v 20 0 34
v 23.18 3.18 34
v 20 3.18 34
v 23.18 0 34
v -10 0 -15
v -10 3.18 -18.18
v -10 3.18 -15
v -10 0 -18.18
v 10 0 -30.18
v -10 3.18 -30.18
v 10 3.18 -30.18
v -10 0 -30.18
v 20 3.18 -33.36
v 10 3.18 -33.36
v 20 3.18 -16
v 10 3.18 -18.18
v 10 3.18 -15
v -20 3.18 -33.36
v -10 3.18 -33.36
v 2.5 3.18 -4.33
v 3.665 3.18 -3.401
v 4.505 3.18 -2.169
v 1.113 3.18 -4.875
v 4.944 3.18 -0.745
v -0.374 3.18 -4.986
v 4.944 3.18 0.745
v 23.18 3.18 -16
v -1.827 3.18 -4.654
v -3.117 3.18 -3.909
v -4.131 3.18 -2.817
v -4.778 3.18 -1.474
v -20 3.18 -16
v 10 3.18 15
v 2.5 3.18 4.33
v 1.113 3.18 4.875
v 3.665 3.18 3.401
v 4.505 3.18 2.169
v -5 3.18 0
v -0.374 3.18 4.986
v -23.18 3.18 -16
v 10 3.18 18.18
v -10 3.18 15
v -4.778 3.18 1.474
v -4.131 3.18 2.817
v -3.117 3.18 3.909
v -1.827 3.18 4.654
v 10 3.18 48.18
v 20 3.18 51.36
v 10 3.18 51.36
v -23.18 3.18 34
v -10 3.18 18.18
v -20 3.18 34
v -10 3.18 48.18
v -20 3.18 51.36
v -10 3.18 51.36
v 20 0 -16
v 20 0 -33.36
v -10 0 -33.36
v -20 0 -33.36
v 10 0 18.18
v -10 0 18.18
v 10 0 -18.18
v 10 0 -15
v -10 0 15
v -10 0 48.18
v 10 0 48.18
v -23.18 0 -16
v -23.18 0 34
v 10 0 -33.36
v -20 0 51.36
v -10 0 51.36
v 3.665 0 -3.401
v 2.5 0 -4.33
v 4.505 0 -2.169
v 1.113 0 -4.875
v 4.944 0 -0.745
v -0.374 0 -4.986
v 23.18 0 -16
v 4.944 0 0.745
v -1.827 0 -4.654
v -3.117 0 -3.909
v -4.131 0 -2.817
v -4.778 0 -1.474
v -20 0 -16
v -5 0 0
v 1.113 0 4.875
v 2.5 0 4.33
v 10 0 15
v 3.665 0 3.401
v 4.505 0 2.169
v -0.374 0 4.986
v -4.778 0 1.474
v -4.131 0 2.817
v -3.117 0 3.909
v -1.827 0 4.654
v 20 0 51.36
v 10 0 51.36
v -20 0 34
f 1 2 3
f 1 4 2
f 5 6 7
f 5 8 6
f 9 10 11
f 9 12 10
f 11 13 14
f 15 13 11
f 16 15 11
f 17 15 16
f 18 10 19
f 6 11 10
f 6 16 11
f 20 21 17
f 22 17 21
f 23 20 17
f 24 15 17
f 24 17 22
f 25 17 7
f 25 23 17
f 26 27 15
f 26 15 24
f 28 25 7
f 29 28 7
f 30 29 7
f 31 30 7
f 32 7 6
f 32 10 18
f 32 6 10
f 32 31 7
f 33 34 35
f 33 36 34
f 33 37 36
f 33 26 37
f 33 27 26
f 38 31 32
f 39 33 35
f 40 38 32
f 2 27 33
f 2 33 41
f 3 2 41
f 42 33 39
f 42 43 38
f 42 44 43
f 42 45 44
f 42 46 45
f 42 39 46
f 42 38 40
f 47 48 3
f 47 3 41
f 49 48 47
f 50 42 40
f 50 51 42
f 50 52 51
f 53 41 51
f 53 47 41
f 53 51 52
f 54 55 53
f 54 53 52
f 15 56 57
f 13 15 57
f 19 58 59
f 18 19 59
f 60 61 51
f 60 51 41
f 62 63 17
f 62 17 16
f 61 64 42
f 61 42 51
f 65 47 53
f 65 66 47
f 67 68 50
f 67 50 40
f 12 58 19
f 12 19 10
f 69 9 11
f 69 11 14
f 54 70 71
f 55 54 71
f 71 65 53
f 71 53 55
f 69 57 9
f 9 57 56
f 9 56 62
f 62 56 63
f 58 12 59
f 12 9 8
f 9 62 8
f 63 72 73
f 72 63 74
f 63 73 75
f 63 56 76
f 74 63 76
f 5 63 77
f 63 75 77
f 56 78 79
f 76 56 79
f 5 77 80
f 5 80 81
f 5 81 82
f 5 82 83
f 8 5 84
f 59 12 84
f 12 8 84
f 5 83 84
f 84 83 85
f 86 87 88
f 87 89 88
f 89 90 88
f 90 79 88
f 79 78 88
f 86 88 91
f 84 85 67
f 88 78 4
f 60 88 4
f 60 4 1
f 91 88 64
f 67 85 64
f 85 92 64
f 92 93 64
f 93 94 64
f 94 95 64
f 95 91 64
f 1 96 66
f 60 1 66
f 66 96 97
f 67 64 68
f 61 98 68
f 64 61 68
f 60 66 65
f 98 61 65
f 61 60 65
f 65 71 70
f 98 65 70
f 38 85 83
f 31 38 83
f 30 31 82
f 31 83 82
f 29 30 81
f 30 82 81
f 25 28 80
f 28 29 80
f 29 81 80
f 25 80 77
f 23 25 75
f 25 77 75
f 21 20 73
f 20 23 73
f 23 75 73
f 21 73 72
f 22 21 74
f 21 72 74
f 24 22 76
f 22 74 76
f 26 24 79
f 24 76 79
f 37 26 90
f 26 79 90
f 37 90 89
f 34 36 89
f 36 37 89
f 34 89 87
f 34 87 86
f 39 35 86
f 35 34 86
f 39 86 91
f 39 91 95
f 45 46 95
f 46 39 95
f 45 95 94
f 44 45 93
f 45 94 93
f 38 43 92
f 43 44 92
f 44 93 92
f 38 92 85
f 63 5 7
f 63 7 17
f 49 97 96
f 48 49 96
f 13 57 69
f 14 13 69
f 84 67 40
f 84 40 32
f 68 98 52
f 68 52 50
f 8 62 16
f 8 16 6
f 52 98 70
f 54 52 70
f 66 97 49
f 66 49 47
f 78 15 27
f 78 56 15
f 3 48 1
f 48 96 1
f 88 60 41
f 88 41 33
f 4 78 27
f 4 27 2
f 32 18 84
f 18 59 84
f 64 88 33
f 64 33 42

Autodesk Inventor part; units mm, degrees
ref_plane "YZ Plane" through (0, 0, 0) normal (1, 0, 0) x (0, 1, 0)
ref_plane "XZ Plane" through (0, 0, 0) normal (0, 1, 0) x (-1, 0, 0)
ref_plane "XY Plane" through (0, 0, 0) normal (0, 0, 1) x (1, 0, 0)
sketch "Boceto1" plane through (0, 0, 0) normal (0, 1, 0) x (-1, 0, 0)
  circle A0 centre (0, 0) radius 5
  line L0 (20, 51.36) -> (-20, 51.36)
  line L1 (-20, 51.36) -> (-20, -33.36)
  line L2 (-20, -33.36) -> (20, -33.36)
  line L3 (20, -33.36) -> (20, 51.36)
  line L4 (10, -15) -> (-10, -15)
  line L5 (-10, -15) -> (-10, -18.18)
  line L6 (-10, -18.18) -> (10, -18.18)
  line L7 (10, -18.18) -> (10, -15)
  line L8 (10, -15) -> (-10, -18.18) construction
  line L9 (-10, -15) -> (10, -18.18) construction
  line L10 (10, -30.18) -> (-10, -30.18)
  line L11 (-10, -30.18) -> (-10, -33.36)
  line L12 (-10, -33.36) -> (10, -33.36)
  line L13 (10, -33.36) -> (10, -30.18)
  line L14 (10, -30.18) -> (-10, -33.36) construction
  line L15 (-10, -30.18) -> (10, -33.36) construction
  line L16 (10, 18.18) -> (-10, 18.18)
  line L17 (-10, 18.18) -> (-10, 15)
  line L18 (-10, 15) -> (10, 15)
  line L19 (10, 15) -> (10, 18.18)
  line L20 (10, 18.18) -> (-10, 15) construction
  line L21 (-10, 18.18) -> (10, 15) construction
  line L22 (10, 51.36) -> (-10, 51.36)
  line L23 (-10, 51.36) -> (-10, 48.18)
  line L24 (-10, 48.18) -> (10, 48.18)
  line L25 (10, 48.18) -> (10, 51.36)
  line L26 (10, 51.36) -> (-10, 48.18) construction
  line L27 (-10, 51.36) -> (10, 48.18) construction
  line L28 (-23.18, 34) -> (-20, 34)
  line L29 (-20, 34) -> (-20, -16)
  line L30 (-20, -16) -> (-23.18, -16)
  line L31 (-23.18, -16) -> (-23.18, 34)
  line L32 (-23.18, 34) -> (-20, -16) construction
  line L33 (-20, 34) -> (-23.18, -16) construction
  line L34 (20, 34) -> (23.18, 34)
  line L35 (23.18, 34) -> (23.18, -16)
  line L36 (23.18, -16) -> (20, -16)
  line L37 (20, -16) -> (20, 34)
  line L38 (20, 34) -> (23.18, -16) construction
  line L39 (23.18, 34) -> (20, -16) construction
  point P0 (0, -16.59)
  point P1 (0, -31.77)
  point P2 (0, 16.59)
  point P3 (0, 49.77)
  point P4 (-21.59, 9)
  point P5 (21.59, 9)
  dimension "d0" = 10
  dimension "d1" = 40
  dimension "d2" = 20
  dimension "d3" = 33.36
  dimension "d5" = 0
  dimension "d6" = 3.18
  dimension "d7" = 20
  dimension "d8" = 3.18
  dimension "d9" = 20
  dimension "d10" = 0
  dimension "d11" = 12
  dimension "d12" = 3.18
  dimension "d13" = 20
  dimension "d14" = 3.18
  dimension "d15" = 20
  dimension "d16" = 0
  dimension "d17" = 0
  dimension "d18" = 30
  dimension "d19" = 30
  dimension "d20" = 3.18
  dimension "d21" = 50
  dimension "d22" = 42.36
  dimension "d23" = 3.18
  dimension "d24" = 50
  dimension "d25" = 42.36
extrude "Extrusión2" add sketch "Boceto1" along normal blind 3.18 contours L3 L2 L13 L10 L11 L1 L0 L23 L24 L25 | L34 L35 L36 L3 | L1 L30 L31 L28
properties part number "HOMBRO_FONDO"
